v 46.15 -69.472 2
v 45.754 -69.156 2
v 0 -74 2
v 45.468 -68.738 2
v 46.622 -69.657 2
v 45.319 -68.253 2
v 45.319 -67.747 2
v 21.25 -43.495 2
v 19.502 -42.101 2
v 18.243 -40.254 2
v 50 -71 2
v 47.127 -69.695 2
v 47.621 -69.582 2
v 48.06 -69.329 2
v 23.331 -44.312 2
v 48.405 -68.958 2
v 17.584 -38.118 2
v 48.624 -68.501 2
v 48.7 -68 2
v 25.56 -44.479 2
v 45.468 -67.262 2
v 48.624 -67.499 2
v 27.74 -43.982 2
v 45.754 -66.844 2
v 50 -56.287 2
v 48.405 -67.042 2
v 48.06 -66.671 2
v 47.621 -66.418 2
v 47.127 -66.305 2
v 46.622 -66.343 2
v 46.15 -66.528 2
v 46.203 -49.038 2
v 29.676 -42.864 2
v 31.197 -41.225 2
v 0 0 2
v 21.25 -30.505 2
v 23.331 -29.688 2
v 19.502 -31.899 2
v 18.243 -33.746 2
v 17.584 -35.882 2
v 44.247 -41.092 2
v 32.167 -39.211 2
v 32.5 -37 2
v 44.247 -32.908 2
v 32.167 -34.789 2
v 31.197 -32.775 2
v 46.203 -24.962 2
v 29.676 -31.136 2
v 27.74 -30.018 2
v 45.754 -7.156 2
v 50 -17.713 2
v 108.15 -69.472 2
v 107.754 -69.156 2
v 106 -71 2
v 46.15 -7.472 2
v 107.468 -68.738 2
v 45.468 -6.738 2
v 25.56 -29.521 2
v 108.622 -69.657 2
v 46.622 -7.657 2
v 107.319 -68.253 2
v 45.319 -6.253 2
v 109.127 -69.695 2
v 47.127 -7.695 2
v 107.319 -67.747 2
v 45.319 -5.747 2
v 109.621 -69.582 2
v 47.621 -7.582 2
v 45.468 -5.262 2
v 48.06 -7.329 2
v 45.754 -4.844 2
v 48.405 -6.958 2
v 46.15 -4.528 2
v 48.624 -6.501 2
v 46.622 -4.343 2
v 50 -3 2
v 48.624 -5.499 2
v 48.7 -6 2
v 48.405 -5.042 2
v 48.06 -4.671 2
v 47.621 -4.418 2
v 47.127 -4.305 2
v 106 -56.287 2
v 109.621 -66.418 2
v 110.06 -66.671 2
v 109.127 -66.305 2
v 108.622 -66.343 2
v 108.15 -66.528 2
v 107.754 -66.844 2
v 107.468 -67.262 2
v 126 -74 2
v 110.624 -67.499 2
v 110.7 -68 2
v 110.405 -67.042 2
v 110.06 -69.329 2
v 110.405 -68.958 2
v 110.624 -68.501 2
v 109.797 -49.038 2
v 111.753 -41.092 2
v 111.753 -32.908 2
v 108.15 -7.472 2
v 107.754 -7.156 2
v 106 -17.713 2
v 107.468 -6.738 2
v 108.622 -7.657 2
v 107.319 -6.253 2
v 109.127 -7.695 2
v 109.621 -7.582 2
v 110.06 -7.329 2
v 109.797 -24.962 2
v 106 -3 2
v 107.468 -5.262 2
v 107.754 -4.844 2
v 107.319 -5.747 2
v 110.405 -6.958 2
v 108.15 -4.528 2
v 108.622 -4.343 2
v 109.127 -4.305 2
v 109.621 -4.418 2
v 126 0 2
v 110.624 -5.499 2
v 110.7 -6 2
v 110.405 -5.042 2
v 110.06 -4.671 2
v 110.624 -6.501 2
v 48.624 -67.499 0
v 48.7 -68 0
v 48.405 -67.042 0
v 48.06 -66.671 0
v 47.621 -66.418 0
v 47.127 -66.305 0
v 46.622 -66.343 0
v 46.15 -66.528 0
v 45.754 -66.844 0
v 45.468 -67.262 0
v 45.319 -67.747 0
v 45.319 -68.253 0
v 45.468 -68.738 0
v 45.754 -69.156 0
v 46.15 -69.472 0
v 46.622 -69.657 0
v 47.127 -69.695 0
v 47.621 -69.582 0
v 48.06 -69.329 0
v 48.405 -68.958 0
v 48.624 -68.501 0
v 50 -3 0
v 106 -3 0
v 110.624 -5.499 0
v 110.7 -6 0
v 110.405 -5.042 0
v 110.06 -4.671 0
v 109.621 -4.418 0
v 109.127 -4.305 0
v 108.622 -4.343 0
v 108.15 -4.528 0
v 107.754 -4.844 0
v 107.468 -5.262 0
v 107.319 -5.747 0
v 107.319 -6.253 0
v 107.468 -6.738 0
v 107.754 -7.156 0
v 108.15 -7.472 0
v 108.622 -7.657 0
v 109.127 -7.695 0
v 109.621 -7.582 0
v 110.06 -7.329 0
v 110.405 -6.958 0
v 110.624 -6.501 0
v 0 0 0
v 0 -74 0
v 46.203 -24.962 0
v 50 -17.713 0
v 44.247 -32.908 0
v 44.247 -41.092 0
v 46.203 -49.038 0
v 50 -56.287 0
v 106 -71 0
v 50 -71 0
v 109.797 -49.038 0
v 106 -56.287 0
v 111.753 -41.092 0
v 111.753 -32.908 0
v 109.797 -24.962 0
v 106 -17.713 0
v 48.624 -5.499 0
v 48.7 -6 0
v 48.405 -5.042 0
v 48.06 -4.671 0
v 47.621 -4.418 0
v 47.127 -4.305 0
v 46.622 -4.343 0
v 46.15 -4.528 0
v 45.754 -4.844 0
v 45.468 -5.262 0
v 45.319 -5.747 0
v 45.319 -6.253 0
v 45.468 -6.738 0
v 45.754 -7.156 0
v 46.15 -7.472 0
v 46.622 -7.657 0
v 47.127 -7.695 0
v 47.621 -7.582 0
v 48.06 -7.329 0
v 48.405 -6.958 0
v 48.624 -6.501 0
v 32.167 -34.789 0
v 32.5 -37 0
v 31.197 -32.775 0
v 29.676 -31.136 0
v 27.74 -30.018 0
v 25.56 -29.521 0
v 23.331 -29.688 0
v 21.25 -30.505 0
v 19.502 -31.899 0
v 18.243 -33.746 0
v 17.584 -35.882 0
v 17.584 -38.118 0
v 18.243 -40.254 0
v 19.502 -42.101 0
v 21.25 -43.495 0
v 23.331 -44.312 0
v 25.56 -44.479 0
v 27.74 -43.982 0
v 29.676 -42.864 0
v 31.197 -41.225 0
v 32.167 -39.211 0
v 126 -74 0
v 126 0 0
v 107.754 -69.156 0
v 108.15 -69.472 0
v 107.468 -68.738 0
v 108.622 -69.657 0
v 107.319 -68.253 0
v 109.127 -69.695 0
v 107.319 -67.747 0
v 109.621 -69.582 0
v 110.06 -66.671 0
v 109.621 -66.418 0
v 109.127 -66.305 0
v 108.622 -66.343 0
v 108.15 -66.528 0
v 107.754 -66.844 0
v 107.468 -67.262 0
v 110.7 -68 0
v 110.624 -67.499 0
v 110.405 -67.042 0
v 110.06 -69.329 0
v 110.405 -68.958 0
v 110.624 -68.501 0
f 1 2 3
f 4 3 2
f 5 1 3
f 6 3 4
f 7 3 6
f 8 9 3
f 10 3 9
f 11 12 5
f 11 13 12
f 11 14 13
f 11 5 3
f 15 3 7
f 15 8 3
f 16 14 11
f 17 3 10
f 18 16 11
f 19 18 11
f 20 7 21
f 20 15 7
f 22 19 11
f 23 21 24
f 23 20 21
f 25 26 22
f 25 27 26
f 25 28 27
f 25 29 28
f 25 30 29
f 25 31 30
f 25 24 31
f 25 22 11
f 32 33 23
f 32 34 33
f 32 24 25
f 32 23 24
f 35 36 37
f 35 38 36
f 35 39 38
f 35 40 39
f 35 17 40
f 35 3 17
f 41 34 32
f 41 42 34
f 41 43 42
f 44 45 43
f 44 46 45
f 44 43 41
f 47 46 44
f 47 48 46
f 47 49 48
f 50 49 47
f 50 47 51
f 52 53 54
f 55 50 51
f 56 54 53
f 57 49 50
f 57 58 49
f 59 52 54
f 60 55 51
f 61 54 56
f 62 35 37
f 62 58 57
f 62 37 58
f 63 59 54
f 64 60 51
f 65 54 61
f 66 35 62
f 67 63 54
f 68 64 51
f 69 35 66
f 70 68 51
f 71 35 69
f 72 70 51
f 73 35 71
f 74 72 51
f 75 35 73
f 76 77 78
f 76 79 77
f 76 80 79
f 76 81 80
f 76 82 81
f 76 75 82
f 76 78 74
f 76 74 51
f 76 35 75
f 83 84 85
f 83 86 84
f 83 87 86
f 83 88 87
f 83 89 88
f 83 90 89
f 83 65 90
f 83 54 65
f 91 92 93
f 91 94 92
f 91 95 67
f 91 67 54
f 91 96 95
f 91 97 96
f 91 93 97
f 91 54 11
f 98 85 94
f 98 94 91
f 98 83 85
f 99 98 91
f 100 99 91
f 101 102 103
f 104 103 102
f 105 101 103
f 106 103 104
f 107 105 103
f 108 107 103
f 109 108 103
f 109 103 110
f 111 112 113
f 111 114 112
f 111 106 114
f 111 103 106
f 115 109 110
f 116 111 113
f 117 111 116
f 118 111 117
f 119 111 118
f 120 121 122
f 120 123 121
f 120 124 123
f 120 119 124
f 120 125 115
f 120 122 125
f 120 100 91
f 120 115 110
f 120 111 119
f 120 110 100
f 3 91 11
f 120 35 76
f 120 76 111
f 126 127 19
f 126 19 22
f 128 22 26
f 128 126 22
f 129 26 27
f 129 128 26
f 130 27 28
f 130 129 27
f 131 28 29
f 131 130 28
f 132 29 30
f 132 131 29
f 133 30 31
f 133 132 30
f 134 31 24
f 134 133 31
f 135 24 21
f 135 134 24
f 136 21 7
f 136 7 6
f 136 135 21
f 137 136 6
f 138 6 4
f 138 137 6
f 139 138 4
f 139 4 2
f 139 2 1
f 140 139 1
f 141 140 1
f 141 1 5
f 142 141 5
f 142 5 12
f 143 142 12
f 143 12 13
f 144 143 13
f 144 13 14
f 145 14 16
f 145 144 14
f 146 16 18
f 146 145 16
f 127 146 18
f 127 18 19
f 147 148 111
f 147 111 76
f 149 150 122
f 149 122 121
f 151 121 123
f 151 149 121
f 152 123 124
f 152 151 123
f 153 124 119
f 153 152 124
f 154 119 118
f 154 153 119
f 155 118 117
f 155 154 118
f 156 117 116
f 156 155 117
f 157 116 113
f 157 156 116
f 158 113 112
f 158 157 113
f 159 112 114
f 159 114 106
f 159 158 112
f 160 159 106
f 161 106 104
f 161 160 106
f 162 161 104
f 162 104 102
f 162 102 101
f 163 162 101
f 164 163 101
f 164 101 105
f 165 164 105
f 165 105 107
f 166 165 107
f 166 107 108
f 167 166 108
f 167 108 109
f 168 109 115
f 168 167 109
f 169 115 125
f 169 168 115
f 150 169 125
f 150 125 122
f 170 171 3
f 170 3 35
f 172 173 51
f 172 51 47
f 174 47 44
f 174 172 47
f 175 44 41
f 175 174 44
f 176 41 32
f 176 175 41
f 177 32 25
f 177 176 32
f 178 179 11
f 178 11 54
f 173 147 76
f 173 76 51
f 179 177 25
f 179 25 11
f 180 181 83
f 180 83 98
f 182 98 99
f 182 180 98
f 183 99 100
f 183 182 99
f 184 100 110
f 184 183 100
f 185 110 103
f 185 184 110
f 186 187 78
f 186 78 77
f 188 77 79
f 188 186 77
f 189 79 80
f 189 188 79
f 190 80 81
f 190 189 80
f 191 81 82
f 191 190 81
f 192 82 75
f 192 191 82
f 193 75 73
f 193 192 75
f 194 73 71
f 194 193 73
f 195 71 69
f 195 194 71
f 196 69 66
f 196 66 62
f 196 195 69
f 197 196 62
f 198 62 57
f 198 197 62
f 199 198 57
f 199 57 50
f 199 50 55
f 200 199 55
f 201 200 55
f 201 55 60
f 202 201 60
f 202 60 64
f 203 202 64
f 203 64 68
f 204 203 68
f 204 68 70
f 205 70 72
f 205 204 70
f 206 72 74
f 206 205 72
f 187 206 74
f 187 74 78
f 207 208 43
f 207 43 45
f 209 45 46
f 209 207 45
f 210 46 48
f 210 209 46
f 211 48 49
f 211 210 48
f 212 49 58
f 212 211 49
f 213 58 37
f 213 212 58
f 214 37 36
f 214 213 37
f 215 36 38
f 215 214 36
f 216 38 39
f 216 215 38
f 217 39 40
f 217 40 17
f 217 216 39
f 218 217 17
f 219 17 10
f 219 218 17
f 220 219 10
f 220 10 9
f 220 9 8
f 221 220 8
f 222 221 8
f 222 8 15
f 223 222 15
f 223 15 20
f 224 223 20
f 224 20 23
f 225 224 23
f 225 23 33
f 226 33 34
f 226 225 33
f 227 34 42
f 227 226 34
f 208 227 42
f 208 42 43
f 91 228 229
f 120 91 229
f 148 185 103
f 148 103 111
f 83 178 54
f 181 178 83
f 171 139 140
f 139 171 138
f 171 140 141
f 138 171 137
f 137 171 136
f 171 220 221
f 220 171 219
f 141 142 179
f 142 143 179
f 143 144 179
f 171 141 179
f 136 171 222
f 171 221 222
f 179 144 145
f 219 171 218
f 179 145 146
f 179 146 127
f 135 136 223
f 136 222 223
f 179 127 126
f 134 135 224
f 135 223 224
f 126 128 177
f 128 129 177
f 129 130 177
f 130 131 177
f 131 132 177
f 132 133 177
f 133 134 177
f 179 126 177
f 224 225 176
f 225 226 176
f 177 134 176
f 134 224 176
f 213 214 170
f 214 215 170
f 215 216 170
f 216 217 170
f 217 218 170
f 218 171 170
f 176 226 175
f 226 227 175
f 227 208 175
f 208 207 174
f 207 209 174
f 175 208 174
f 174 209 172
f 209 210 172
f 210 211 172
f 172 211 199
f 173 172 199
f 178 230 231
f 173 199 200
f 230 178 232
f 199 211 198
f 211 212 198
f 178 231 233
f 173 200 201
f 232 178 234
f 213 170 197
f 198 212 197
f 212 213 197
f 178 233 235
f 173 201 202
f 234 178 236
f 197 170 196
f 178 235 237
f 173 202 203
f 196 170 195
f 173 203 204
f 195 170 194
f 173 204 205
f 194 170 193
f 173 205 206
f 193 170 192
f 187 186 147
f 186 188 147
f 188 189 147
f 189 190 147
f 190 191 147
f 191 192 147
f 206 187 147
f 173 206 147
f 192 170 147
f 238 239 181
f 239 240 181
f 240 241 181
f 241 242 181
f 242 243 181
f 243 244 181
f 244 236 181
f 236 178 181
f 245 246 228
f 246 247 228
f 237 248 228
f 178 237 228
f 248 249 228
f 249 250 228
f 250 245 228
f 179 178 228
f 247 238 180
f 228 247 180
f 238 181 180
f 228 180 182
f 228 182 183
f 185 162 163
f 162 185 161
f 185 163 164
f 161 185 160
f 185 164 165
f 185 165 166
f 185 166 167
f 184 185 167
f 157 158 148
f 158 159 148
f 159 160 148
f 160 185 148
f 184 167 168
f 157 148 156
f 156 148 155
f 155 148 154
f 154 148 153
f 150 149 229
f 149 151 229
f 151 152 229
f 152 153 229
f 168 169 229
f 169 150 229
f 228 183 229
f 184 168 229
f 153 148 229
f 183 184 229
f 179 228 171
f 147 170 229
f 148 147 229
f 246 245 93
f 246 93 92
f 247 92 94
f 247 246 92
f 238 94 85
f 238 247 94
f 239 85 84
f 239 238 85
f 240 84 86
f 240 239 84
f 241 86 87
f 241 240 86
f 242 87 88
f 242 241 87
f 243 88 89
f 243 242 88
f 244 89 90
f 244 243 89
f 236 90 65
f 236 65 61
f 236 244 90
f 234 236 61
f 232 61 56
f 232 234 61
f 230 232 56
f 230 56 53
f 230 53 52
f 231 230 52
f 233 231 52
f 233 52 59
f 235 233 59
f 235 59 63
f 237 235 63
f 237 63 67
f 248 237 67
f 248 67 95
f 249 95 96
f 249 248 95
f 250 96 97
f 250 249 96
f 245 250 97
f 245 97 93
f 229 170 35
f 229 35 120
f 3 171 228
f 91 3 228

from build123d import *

# Parameters (mm, degrees)
ESBO_O1_W                = 126
ESBO_O1_H                = 74
ESBO_O1_R                = 1.7
ESBO_O1_R_2              = 7.5
RESSALTO_EXTRUS_O1_DEPTH = 2


with BuildPart() as part:
    # Esboço1 → Ressalto-extrusão1 (new body)
    with BuildSketch(Plane.XY):
        with Locations((63, -37)):
            Rectangle(ESBO_O1_W, ESBO_O1_H)
        with Locations((47, -6)):
            Circle(ESBO_O1_R, mode=Mode.SUBTRACT)
        with Locations((109, -6)):
            Circle(ESBO_O1_R, mode=Mode.SUBTRACT)
        with Locations((47, -68)):
            Circle(ESBO_O1_R, mode=Mode.SUBTRACT)
        with Locations((109, -68)):
            Circle(ESBO_O1_R, mode=Mode.SUBTRACT)
        with Locations((25, -37)):
            Circle(ESBO_O1_R_2, mode=Mode.SUBTRACT)
        with BuildLine():
            Line((50, -3), (50, -17.712698478))
            ThreePointArc((50, -17.712698478), (44, -37), (50, -56.287301522))
            Line((50, -56.287301522), (50, -71))
            Line((50, -71), (106, -71))
            Line((106, -71), (106, -56.287301522))
            ThreePointArc((106, -56.287301522), (112, -37), (106, -17.712698478))
            Line((106, -17.712698478), (106, -3))
            Line((106, -3), (50, -3))
        make_face(mode=Mode.SUBTRACT)
    extrude(amount=RESSALTO_EXTRUS_O1_DEPTH)


solid = part.part
